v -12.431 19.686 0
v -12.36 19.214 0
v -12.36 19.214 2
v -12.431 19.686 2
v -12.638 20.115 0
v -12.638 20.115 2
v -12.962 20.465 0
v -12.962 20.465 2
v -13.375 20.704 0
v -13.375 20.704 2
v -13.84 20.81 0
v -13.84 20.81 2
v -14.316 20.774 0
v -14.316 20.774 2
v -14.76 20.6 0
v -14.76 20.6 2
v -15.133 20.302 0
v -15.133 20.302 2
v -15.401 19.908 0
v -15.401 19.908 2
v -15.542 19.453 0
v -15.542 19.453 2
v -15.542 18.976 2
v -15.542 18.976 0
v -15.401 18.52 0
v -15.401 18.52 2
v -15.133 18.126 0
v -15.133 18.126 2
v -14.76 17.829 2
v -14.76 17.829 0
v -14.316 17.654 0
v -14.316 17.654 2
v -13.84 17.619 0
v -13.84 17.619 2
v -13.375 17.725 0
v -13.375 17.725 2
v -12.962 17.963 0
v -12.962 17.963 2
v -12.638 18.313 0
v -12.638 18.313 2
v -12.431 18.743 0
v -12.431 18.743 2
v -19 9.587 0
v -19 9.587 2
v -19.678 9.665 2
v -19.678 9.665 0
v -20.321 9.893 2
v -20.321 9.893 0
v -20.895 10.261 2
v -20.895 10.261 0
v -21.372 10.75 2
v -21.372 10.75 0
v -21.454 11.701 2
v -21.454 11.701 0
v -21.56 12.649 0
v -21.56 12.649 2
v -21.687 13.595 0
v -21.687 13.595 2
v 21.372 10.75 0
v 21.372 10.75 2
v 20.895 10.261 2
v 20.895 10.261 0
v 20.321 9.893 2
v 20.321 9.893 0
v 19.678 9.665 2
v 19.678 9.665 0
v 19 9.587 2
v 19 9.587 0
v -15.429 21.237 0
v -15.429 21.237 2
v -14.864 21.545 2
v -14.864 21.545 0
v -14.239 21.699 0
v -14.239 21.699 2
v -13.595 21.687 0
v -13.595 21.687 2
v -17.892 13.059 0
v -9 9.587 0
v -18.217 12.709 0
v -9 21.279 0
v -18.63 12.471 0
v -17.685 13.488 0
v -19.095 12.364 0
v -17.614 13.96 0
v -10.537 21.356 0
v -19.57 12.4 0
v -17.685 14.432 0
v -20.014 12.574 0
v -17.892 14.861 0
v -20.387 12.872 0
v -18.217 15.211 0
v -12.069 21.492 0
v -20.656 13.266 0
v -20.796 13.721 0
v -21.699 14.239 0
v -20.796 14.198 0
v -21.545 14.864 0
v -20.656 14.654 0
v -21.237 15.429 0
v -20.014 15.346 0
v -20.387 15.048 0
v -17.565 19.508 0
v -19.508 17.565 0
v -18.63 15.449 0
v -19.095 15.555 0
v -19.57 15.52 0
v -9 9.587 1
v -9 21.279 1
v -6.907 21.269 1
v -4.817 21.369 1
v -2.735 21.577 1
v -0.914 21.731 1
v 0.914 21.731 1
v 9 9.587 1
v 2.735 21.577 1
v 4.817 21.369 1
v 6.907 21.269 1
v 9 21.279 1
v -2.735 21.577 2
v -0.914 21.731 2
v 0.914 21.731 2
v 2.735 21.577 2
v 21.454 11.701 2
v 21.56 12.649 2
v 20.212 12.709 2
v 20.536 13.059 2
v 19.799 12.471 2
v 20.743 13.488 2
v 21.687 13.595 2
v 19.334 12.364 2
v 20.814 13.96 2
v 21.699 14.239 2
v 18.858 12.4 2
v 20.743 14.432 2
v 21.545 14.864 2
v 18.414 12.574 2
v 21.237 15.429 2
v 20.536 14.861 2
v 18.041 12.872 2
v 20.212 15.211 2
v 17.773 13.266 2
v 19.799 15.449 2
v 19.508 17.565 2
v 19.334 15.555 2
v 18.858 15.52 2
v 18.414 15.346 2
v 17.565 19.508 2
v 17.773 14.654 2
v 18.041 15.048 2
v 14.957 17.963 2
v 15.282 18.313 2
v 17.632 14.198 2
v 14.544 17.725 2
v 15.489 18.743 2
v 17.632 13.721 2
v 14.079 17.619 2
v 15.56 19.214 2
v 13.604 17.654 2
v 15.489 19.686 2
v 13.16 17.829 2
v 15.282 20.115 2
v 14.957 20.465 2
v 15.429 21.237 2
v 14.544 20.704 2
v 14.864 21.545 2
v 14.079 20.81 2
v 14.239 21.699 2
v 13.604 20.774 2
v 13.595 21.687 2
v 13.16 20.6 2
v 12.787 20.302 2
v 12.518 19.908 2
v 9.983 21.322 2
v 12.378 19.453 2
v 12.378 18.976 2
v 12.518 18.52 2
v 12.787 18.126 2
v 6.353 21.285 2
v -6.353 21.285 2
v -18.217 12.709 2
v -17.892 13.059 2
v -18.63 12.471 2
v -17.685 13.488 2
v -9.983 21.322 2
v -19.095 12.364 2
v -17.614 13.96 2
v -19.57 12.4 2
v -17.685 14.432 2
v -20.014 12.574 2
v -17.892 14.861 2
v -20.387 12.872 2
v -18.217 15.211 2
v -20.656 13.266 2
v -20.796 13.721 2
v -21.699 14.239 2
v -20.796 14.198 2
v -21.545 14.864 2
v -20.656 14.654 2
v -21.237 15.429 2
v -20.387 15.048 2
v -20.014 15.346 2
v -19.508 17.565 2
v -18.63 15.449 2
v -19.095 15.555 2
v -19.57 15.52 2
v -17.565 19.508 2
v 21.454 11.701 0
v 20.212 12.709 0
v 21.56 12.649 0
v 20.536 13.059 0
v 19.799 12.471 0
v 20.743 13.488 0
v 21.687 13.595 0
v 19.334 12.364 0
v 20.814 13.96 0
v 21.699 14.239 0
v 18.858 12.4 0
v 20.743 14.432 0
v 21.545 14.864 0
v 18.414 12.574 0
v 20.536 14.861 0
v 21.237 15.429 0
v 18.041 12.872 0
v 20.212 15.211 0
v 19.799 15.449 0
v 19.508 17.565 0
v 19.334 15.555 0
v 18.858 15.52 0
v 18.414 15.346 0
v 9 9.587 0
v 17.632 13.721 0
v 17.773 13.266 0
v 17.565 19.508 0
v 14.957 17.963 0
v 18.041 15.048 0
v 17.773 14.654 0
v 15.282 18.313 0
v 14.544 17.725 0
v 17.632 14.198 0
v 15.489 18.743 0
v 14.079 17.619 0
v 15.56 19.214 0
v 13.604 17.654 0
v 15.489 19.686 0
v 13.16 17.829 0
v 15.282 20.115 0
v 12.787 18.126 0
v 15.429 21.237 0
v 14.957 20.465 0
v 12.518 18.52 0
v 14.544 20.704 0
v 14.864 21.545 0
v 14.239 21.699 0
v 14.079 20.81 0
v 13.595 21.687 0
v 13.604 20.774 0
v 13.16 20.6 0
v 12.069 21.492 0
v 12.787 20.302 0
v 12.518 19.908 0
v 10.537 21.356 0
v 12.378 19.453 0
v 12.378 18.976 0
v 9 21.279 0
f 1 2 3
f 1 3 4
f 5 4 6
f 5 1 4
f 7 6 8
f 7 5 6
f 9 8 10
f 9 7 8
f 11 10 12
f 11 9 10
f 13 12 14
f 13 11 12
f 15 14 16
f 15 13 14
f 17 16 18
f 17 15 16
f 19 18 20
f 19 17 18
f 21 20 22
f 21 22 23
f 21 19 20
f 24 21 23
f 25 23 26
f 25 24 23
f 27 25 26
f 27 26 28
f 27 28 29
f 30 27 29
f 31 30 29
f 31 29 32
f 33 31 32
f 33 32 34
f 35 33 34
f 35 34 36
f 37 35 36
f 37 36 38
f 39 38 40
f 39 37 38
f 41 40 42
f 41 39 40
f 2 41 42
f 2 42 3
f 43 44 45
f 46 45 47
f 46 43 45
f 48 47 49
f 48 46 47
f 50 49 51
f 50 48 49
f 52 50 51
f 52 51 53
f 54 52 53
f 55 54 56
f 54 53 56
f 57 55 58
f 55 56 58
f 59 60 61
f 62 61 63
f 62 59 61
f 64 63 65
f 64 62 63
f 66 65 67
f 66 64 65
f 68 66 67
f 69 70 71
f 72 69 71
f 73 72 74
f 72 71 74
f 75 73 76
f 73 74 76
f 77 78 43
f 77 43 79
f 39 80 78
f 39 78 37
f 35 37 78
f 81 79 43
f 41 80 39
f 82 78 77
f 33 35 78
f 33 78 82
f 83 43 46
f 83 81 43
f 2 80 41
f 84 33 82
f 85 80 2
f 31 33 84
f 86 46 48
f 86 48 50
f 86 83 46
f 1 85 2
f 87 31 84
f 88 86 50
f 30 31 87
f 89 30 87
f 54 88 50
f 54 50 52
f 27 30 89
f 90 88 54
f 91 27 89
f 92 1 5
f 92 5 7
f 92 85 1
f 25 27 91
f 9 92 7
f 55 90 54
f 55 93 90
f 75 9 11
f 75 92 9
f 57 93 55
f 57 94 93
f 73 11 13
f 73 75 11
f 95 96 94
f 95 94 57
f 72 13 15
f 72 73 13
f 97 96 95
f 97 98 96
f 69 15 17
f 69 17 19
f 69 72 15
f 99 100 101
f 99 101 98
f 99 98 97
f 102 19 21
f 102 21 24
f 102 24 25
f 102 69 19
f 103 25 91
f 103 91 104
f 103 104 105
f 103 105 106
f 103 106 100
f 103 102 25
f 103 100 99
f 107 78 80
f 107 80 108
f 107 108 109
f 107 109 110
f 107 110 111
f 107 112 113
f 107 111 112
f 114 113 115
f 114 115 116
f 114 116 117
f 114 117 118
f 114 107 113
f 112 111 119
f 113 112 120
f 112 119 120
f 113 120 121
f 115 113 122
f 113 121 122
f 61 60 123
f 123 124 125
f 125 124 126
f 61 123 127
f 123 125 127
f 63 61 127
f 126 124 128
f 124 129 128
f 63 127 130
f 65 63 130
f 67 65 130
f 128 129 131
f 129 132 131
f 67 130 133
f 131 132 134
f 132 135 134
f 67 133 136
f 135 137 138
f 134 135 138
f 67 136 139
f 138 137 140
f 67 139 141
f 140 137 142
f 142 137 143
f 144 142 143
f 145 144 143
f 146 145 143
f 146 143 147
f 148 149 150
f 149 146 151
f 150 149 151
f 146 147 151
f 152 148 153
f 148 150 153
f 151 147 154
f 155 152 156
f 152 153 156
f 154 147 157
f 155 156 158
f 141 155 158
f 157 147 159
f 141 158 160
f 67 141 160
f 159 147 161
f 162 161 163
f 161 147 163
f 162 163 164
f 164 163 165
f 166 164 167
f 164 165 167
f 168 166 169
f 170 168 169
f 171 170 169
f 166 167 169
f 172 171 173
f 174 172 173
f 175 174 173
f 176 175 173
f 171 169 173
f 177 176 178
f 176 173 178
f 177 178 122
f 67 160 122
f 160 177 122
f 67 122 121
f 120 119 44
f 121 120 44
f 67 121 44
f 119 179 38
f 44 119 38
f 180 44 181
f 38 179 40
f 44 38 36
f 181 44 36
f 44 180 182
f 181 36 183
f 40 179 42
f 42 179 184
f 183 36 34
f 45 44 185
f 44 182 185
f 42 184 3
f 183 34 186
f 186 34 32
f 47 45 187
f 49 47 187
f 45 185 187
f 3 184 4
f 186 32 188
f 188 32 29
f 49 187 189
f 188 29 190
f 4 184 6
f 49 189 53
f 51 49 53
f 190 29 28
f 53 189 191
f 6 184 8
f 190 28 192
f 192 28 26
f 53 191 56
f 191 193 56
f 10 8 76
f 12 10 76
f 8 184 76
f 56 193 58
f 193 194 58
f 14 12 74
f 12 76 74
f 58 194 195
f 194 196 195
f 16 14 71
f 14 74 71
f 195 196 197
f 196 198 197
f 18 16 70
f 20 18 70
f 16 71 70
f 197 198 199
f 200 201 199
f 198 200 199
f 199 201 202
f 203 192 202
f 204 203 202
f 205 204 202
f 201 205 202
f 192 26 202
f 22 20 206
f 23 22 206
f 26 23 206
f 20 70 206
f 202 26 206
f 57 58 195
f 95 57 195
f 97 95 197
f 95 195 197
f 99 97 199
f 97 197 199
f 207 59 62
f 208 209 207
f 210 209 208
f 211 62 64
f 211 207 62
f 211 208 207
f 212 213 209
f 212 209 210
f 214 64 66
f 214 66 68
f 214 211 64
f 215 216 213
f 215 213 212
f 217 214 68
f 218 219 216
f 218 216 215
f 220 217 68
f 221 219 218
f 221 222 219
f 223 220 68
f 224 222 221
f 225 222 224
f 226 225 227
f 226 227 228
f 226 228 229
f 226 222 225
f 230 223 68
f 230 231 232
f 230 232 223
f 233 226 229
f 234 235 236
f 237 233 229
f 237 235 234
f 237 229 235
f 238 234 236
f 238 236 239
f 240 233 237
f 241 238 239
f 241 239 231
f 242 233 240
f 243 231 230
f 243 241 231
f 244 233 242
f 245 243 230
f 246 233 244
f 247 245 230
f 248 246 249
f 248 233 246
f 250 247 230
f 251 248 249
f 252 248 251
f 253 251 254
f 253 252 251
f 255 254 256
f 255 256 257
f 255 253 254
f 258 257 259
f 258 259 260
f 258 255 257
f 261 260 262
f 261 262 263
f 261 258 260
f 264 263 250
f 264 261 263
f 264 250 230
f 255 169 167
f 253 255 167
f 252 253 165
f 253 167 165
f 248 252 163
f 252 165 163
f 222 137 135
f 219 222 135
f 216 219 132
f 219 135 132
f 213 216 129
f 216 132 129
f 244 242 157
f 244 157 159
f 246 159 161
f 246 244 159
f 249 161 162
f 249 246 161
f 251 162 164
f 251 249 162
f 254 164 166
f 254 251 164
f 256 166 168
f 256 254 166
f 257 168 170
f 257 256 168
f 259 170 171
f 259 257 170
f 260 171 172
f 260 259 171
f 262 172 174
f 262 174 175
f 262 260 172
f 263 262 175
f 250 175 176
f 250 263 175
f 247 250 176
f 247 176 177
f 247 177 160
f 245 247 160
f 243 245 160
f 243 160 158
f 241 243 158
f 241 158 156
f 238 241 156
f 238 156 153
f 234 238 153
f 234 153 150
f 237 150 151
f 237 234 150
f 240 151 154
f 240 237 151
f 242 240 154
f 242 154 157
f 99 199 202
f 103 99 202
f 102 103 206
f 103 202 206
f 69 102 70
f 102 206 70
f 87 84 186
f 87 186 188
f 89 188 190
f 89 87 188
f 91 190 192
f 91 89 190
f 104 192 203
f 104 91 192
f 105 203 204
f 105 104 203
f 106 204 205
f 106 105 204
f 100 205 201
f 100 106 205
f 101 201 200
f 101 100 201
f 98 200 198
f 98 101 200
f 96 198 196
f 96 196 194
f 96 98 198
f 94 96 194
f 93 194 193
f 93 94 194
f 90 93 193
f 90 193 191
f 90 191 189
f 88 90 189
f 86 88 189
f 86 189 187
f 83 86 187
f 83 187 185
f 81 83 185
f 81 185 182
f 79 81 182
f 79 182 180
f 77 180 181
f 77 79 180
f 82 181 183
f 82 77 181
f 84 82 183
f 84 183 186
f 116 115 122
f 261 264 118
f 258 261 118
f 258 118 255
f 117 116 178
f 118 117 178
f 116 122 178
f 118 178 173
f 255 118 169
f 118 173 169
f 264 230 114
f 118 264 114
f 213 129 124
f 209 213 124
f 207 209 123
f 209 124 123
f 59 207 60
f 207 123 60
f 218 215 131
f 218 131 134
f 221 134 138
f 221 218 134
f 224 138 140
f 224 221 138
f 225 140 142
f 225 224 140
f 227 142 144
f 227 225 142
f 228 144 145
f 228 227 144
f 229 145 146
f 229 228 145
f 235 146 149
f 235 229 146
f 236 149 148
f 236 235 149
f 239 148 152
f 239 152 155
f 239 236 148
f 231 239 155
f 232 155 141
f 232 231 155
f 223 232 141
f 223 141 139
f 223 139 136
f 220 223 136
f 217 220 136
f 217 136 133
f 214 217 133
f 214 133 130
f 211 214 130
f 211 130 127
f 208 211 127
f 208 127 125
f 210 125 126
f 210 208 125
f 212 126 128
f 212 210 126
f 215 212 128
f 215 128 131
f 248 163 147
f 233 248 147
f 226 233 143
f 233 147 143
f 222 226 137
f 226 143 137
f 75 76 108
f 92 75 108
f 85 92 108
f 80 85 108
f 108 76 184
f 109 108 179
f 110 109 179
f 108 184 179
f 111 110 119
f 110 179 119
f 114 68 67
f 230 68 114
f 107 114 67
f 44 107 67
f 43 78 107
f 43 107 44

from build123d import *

# Parameters (mm, degrees)
SKETCH_1_R          = 1.6
EXTRUDE_1_DEPTH     = 2
SKETCH_2_W          = 18
SKETCH_2_H          = 1
CUT_EXTRUDE_1_DEPTH = 27.153393661
CUT_EXTRUDE_2_DEPTH = 33.316370891


with BuildPart() as part:
    # 草图1 → 凸台-拉伸1 (new body)
    with BuildSketch(Plane.XY):
        with BuildLine():
            Line((-19, 23.587026679), (19, 23.587026679))
            ThreePointArc((19, 23.587026679), (21.121320344, 22.708347023), (22, 20.587026679))
            Line((22, 20.587026679), (22, 12.587026679))
            ThreePointArc((22, 12.587026679), (21.121320344, 10.465706336), (19, 9.587026679))
            Line((19, 9.587026679), (-19, 9.587026679))
            ThreePointArc((-19, 9.587026679), (-21.121320344, 10.465706336), (-22, 12.587026679))
            Line((-22, 12.587026679), (-22, 20.587026679))
            ThreePointArc((-22, 20.587026679), (-21.121320344, 22.708347023), (-19, 23.587026679))
        make_face()
        with Locations((19.214153616, 13.959899742)):
            Circle(SKETCH_1_R, mode=Mode.SUBTRACT)
        with Locations((13.959899742, 19.214153616)):
            Circle(SKETCH_1_R, mode=Mode.SUBTRACT)
        with Locations((-13.959899742, 19.214153616)):
            Circle(SKETCH_1_R, mode=Mode.SUBTRACT)
        with Locations((-19.214153616, 13.959899742)):
            Circle(SKETCH_1_R, mode=Mode.SUBTRACT)
    extrude(amount=EXTRUDE_1_DEPTH)

    # 草图2 → 切除-拉伸1 (cut, through all)
    with BuildSketch(Plane.XZ.offset(-9.587026679)):
        with Locations((0, 0.5)):
            Rectangle(SKETCH_2_W, SKETCH_2_H)
    extrude(amount=-CUT_EXTRUDE_1_DEPTH, mode=Mode.SUBTRACT)

    # 草图3 → 切除-拉伸2 (cut, through all)
    with BuildSketch(Plane.XY.offset(2)):
        with BuildLine():
            Line((22, 12.587026679), (22, 20.587026679))
            ThreePointArc((22, 20.587026679), (21.121320344, 22.708347023), (19, 23.587026679))
            Line((19, 23.587026679), (-19, 23.587026679))
            ThreePointArc((-19, 23.587026679), (-21.121320344, 22.708347023), (-22, 20.587026679))
            Line((-22, 20.587026679), (-22, 12.587026679))
            ThreePointArc((-22, 12.587026679), (-21.838569798, 11.616191212), (-21.371652331, 10.749837189))
            ThreePointArc((-21.371652331, 10.749837189), (-21.504078669, 12.175448442), (-21.687439927, 13.595407183))
            ThreePointArc((-21.687439927, 13.595407183), (-21.641903091, 14.556584324), (-21.236696102, 15.429362873))
            ThreePointArc((-21.236696102, 15.429362873), (-18.561553006, 18.561553006), (-15.429362873, 21.236696102))
            ThreePointArc((-15.429362873, 21.236696102), (-14.556584324, 21.641903091), (-13.595407183, 21.687439927))
            ThreePointArc((-13.595407183, 21.687439927), (-8.168716079, 21.262073185), (-2.734521388, 21.577416267))
            ThreePointArc((-2.734521388, 21.577416267), (0, 21.75), (2.734521388, 21.577416267))
            ThreePointArc((2.734521388, 21.577416267), (8.168716079, 21.262073185), (13.595407183, 21.687439927))
            ThreePointArc((13.595407183, 21.687439927), (14.556584324, 21.641903091), (15.429362873, 21.236696102))
            ThreePointArc((15.429362873, 21.236696102), (18.561553006, 18.561553006), (21.236696102, 15.429362873))
            ThreePointArc((21.236696102, 15.429362873), (21.641903091, 14.556584324), (21.687439927, 13.595407183))
            ThreePointArc((21.687439927, 13.595407183), (21.504078669, 12.175448442), (21.371652331, 10.749837189))
            ThreePointArc((21.371652331, 10.749837189), (21.838569798, 11.616191212), (22, 12.587026679))
        make_face()
    extrude(amount=-CUT_EXTRUDE_2_DEPTH, mode=Mode.SUBTRACT)


solid = part.part
